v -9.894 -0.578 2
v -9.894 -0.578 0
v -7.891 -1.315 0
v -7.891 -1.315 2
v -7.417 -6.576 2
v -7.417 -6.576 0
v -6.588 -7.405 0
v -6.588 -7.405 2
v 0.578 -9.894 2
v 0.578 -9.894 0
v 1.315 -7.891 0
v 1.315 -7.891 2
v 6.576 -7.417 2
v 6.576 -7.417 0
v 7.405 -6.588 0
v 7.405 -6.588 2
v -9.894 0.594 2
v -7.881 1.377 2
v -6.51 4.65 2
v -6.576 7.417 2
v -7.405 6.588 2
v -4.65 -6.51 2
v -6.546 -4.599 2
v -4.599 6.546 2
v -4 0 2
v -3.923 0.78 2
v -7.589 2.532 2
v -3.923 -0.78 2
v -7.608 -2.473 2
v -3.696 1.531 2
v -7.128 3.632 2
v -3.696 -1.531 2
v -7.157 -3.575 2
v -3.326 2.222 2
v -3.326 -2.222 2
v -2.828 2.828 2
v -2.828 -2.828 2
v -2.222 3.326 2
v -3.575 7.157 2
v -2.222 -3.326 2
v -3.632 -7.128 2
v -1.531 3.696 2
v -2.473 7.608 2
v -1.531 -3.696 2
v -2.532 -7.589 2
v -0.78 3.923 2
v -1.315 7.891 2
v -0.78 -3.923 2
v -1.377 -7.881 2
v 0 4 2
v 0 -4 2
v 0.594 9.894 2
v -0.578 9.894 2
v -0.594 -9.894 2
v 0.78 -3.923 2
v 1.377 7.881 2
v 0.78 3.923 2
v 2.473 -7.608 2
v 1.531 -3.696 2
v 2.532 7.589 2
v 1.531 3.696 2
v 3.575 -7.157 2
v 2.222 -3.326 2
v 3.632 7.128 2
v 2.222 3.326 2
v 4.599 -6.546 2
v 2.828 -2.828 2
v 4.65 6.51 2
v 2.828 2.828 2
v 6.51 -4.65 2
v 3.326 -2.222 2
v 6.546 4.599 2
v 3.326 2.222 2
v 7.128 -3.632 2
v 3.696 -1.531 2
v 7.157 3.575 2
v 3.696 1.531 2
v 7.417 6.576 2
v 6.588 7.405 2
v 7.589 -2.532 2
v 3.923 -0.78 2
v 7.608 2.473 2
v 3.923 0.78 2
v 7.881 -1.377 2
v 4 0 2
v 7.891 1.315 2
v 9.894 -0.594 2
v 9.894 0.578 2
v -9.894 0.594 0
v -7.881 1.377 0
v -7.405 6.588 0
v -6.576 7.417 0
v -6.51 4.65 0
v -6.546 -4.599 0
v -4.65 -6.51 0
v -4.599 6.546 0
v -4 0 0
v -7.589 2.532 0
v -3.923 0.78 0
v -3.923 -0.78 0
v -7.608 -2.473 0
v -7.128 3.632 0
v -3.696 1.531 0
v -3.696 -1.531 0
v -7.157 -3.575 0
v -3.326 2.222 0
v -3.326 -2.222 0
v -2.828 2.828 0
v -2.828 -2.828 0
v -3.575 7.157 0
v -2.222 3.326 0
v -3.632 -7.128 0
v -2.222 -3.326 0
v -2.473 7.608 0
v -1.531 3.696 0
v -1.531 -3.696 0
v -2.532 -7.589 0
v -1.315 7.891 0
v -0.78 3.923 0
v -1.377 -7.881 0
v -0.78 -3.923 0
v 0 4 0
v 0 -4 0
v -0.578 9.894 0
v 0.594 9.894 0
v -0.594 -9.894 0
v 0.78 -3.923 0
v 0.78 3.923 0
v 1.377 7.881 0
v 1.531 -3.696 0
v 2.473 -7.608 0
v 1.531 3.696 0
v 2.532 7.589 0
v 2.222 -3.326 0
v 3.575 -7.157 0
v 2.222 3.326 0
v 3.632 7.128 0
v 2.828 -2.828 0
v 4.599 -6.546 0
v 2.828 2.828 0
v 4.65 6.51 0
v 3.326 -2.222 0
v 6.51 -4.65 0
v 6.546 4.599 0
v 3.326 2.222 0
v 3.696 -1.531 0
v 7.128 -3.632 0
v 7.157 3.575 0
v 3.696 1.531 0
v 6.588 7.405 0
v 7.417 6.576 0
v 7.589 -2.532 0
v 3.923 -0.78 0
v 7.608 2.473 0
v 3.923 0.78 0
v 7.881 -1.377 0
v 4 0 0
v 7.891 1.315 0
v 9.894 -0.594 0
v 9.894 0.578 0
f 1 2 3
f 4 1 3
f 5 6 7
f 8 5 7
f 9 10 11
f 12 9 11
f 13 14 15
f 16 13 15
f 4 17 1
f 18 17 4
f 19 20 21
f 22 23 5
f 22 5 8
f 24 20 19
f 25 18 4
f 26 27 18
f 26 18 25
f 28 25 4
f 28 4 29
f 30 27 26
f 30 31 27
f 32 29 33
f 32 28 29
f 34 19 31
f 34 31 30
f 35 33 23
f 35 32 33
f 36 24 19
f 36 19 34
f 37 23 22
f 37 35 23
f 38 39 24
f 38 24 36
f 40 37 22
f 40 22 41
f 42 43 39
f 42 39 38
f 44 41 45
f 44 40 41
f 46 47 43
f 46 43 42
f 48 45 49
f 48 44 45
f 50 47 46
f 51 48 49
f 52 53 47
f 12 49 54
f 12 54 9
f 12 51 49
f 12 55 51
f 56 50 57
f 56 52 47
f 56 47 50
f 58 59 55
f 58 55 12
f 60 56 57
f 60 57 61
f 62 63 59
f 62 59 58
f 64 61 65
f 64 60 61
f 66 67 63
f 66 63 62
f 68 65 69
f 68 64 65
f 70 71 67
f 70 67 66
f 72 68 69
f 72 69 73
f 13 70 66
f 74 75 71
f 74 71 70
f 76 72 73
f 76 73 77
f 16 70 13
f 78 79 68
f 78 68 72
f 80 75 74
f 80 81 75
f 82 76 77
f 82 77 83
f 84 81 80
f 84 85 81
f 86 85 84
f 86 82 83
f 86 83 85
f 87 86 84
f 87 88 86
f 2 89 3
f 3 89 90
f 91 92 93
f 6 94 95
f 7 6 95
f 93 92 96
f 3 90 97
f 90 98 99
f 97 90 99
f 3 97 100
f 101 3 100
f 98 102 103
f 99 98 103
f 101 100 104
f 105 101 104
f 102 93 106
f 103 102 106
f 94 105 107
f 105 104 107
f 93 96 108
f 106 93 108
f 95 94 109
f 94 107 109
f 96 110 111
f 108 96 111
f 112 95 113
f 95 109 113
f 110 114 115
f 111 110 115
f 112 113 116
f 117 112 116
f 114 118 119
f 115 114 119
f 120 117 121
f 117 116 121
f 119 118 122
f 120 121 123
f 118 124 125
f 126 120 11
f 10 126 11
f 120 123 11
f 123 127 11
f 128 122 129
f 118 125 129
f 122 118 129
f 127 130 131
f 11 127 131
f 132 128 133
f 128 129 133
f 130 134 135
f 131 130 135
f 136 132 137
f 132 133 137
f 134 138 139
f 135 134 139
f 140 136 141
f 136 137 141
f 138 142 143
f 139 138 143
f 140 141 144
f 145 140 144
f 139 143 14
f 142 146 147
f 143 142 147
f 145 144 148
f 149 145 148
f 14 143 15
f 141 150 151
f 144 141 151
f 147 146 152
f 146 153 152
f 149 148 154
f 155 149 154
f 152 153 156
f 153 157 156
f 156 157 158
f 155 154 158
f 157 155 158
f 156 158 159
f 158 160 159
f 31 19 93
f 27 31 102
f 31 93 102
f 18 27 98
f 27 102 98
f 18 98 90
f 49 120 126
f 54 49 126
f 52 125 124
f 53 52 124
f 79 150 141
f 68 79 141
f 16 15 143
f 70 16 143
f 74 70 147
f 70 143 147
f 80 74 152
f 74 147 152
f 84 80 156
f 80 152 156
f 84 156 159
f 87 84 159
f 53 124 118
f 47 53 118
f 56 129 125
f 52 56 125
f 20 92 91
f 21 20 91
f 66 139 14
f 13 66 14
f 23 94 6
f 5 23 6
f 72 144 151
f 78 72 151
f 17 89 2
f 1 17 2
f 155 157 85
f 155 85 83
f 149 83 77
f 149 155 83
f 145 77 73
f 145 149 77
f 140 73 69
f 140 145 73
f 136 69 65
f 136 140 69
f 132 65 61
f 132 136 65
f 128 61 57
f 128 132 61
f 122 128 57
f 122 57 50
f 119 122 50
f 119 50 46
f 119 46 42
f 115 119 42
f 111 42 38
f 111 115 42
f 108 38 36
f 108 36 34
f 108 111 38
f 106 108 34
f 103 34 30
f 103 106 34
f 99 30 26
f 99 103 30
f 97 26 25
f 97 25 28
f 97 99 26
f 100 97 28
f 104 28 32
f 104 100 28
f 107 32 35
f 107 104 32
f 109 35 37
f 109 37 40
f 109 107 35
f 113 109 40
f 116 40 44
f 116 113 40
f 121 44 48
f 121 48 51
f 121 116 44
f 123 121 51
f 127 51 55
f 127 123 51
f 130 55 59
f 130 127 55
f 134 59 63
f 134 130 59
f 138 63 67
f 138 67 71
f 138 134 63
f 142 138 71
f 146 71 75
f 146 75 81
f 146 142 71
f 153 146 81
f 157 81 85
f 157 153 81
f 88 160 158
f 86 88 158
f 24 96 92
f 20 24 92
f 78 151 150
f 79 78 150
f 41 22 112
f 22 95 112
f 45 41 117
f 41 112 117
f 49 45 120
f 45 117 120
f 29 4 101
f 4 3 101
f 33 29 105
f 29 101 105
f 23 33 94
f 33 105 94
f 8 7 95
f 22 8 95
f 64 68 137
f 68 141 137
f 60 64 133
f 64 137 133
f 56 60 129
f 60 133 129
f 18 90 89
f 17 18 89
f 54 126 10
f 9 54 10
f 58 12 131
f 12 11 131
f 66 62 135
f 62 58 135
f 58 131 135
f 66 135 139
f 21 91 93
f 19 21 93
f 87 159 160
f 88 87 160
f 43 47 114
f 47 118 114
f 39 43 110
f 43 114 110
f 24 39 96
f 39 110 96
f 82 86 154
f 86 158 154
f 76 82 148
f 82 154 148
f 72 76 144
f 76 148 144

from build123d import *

# Parameters (mm, degrees)
CROQUIS1_R              = 8
CROQUIS1_R_2            = 4
SALIENTE_EXTRUIR5_DEPTH = 2
SALIENTE_EXTRUIR7_DEPTH = 2
MATRIZC5_COUNT          = 8


with BuildPart() as part:
    # Croquis1 → Saliente-Extruir5 (new body)
    with BuildSketch(Plane.XY):
        Circle(CROQUIS1_R)
        Circle(CROQUIS1_R_2, mode=Mode.SUBTRACT)
    extrude(amount=SALIENTE_EXTRUIR5_DEPTH)

    # Croquis5 → Saliente-Extruir7 (add)
    with BuildSketch(Plane.XY):
        Polygon((0.009306697, 9.894487771), (-0.577837412, 9.894487771), (-1.314748981, 7.891225198), (-1.314748981, 7.565133639), (1.376804344, 7.565133639), (1.376804344, 7.880635114), (0.594453217, 9.894487771), align=None)
    saliente_extruir7 = extrude(amount=SALIENTE_EXTRUIR7_DEPTH)

    # MatrizC5: Saliente-Extruir7 ×8 about axis
    matrizc5_axis = Axis((0, 0, 0), (0, 0, 1))
    for i in range(1, MATRIZC5_COUNT):
        add(saliente_extruir7.rotate(matrizc5_axis, i * 360 / MATRIZC5_COUNT))


solid = part.part
